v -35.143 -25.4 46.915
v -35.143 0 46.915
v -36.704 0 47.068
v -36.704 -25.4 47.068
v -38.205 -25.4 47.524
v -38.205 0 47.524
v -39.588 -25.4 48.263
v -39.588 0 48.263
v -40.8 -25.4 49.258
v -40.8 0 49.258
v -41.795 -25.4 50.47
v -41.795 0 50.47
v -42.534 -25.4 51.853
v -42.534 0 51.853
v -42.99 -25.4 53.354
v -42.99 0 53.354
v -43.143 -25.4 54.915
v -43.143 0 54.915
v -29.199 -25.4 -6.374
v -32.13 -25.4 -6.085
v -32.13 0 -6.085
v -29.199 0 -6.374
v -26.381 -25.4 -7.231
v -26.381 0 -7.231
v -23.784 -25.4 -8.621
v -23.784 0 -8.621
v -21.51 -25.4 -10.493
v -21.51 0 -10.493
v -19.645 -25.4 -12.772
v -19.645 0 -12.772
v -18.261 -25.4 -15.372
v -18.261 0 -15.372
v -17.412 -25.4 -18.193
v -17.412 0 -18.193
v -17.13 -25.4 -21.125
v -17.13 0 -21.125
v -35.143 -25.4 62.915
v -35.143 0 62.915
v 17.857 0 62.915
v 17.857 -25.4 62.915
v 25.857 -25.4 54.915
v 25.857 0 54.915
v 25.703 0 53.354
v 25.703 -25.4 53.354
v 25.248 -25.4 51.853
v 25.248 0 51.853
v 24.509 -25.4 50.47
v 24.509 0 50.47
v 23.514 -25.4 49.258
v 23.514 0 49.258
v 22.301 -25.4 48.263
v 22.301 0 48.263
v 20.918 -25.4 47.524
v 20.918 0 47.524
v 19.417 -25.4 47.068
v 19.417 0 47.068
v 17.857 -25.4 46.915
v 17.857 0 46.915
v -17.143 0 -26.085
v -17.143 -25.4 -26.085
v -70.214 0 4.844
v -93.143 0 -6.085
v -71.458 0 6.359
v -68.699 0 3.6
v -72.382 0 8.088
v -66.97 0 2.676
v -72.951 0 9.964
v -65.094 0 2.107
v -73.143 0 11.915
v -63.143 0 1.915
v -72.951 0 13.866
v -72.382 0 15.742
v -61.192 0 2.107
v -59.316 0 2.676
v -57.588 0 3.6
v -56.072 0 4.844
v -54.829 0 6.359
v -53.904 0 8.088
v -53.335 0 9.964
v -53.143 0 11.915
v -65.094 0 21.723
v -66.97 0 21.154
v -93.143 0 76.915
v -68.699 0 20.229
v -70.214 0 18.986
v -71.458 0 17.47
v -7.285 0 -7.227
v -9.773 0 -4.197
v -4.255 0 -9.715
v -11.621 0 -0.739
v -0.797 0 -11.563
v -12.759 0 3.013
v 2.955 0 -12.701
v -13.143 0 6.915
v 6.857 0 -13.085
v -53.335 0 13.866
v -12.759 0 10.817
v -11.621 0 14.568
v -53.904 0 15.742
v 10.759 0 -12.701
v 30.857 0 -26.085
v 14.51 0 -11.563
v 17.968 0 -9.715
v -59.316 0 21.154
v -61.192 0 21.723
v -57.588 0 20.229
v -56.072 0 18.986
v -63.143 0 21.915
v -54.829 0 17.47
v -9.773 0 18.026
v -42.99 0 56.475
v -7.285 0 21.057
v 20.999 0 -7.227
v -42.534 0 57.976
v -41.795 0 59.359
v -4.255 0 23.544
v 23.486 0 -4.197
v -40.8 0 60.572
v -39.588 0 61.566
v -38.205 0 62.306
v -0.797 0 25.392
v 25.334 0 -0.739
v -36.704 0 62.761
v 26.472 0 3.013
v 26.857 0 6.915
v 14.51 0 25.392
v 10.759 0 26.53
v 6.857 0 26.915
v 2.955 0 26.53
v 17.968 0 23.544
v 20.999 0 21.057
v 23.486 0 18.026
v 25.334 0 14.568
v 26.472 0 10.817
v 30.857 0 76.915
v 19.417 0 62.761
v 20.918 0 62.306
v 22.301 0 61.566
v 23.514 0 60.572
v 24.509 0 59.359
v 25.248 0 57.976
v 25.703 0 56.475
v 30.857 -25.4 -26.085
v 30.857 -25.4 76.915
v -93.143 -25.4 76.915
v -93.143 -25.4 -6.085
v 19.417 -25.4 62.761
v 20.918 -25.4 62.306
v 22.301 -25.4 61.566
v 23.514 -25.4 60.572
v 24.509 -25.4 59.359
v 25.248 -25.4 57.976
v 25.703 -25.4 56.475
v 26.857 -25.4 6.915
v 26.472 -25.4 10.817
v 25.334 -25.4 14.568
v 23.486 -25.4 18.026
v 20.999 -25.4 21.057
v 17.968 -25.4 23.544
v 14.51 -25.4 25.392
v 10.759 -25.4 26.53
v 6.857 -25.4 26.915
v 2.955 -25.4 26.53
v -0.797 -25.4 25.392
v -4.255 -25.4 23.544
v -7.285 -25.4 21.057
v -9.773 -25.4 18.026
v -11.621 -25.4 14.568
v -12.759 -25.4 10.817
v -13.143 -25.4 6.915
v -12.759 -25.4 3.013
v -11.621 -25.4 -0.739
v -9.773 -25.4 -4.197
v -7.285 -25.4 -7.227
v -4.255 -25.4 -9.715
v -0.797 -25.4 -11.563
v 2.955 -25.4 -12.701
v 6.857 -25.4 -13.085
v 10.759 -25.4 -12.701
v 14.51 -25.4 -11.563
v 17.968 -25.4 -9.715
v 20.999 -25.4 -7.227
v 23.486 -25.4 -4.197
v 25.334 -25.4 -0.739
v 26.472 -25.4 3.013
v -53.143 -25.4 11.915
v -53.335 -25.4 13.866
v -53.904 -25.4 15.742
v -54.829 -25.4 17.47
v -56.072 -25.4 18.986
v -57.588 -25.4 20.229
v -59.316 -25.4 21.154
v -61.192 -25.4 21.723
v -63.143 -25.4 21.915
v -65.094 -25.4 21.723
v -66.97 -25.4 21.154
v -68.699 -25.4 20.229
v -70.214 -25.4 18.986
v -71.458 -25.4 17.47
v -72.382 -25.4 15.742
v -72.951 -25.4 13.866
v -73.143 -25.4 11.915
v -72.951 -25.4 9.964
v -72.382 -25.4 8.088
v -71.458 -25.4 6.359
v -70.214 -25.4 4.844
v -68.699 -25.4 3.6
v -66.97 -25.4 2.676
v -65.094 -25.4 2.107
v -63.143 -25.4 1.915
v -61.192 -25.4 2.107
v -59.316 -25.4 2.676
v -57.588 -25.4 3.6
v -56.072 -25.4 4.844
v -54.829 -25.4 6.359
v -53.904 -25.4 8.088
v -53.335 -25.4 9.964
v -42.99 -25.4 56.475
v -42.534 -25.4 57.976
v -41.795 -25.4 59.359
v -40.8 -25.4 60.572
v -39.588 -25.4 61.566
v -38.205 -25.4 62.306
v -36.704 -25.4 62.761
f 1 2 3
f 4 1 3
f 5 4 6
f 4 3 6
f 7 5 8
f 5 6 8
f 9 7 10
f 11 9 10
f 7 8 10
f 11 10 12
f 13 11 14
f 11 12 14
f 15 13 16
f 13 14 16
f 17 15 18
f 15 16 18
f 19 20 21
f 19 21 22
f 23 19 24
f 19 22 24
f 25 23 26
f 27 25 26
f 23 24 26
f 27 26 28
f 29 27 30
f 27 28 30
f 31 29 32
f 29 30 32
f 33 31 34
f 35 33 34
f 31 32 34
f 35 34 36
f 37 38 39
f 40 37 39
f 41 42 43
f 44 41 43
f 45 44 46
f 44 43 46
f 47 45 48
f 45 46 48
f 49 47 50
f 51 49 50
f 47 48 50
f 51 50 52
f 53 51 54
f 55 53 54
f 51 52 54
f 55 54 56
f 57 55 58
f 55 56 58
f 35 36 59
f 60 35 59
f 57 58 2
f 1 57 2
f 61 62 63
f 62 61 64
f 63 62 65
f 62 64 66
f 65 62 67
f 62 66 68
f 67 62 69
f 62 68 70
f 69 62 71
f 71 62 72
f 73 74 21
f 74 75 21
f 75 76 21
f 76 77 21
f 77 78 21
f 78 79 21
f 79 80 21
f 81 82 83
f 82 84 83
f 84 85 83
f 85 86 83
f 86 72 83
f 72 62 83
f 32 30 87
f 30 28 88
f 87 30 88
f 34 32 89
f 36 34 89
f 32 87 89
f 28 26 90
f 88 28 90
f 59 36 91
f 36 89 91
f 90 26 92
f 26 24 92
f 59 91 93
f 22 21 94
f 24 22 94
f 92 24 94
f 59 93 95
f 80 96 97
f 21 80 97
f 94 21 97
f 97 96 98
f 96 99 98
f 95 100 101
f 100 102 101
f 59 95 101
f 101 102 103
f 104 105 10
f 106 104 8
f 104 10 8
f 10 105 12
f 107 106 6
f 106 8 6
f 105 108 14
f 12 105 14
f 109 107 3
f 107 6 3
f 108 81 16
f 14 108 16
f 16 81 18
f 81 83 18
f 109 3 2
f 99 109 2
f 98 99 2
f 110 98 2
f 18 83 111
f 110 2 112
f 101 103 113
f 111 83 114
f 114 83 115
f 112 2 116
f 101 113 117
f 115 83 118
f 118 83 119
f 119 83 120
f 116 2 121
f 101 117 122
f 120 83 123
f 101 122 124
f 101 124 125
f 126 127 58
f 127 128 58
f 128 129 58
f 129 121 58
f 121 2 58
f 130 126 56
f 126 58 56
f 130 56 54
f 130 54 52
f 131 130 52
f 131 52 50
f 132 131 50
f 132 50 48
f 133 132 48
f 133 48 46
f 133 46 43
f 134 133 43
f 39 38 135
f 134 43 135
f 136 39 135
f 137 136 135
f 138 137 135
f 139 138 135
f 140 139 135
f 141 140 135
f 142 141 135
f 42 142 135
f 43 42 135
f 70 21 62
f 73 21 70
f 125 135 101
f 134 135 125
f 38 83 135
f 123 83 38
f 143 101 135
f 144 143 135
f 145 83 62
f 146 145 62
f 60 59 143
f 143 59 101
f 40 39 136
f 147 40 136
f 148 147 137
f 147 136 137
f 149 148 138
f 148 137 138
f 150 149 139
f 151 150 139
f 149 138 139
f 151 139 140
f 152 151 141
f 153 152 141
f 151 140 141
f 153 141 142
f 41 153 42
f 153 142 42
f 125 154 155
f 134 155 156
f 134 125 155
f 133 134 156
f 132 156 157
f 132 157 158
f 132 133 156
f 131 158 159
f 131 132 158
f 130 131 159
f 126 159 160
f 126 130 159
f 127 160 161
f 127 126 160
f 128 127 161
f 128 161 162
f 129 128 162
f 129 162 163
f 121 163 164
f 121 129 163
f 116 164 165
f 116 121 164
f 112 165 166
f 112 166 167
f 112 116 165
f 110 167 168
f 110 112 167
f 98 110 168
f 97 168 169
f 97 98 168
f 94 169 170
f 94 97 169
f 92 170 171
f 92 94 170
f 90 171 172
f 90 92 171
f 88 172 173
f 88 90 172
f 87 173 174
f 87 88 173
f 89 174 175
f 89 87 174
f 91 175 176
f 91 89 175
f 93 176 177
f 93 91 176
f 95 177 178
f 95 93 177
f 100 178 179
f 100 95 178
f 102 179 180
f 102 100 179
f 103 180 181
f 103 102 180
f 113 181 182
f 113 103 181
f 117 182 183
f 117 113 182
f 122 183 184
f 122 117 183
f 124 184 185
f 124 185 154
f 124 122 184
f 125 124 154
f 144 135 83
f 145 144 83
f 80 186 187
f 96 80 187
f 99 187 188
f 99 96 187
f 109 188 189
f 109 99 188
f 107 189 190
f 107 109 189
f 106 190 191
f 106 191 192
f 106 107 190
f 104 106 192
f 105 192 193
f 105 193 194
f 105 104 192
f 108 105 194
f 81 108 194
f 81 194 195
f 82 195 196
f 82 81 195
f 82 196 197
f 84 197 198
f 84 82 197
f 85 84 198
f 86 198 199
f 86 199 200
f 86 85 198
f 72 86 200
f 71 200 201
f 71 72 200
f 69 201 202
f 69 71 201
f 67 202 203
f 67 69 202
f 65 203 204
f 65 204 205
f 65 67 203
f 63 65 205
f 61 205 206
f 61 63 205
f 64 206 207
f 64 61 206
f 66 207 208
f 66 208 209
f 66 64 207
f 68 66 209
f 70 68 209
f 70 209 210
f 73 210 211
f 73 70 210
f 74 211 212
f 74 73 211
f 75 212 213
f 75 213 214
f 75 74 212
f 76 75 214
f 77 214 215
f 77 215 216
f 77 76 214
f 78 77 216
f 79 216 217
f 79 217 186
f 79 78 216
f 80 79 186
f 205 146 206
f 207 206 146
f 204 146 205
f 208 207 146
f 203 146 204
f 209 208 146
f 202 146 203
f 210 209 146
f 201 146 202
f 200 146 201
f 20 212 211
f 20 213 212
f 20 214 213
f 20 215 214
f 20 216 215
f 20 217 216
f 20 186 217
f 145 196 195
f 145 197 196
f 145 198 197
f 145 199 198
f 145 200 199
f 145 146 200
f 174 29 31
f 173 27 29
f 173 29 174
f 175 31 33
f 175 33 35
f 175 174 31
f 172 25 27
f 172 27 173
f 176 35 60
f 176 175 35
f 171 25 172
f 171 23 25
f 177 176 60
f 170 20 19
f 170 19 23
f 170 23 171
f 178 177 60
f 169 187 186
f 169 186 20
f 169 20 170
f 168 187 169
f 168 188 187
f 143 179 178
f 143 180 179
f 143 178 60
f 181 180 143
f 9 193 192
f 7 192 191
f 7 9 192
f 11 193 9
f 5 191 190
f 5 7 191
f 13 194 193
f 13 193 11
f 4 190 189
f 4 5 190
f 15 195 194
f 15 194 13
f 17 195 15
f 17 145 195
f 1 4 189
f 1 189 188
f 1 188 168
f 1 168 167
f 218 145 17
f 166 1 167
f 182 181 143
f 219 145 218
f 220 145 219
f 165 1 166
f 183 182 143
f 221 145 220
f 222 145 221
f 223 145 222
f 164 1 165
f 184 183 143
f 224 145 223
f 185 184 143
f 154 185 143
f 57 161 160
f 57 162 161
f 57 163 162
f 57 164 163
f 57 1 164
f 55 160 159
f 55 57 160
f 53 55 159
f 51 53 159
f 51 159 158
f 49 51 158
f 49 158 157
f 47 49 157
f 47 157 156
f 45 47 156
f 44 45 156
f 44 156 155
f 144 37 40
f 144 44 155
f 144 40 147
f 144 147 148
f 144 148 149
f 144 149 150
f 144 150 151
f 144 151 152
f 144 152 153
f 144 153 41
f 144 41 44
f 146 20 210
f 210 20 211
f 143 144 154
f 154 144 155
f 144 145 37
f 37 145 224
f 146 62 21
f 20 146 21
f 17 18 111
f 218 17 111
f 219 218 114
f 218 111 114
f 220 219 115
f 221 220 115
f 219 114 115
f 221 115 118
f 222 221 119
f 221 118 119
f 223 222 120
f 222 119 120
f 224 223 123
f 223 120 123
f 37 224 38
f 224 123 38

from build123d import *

# Parameters (mm, degrees)
F0_R     = 10
F0_R_2   = 20
F1_DEPTH = 25.4


with BuildPart() as f1:
    # F0 (on Front) → F1 (new body)
    with BuildSketch(Plane.XZ):
        with BuildLine():
            Line((-43.143227, 76.914711), (-93.143227, 76.914711))
            Line((-93.143227, 76.914711), (-93.143227, 11.914711))
            Line((-93.143227, 11.914711), (-93.143227, -6.085289))
            Line((-93.143227, -6.085289), (-64.090909, -6.085289))
            Line((-64.090909, -6.085289), (-32.130199, -6.085289))
            ThreePointArc((-32.130199, -6.085289), (-21.509733, -10.492569), (-17.13025, -21.124528))
            Line((-17.13025, -21.124528), (-17.143227, -26.085289))
            Line((-17.143227, -26.085289), (6.856773, -26.085289))
            Line((6.856773, -26.085289), (30.856773, -26.085289))
            Line((30.856773, -26.085289), (30.856773, 6.914711))
            Line((30.856773, 6.914711), (30.856773, 46.914711))
            Line((30.856773, 46.914711), (30.856773, 62.914711))
            Line((30.856773, 62.914711), (30.856773, 76.914711))
            Line((30.856773, 76.914711), (25.856773, 76.914711))
            Line((25.856773, 76.914711), (-43.143227, 76.914711))
        make_face()
        with Locations((-63.143227, 11.914711)):
            Circle(F0_R, mode=Mode.SUBTRACT)
        with Locations((6.856773, 6.914711)):
            Circle(F0_R_2, mode=Mode.SUBTRACT)
        with BuildLine():
            ThreePointArc((25.856773, 54.914711), (23.513628, 49.257857), (17.856773, 46.914711))
            Line((17.856773, 46.914711), (-35.143227, 46.914711))
            ThreePointArc((-35.143227, 46.914711), (-40.800081, 49.257857), (-43.143227, 54.914711))
            ThreePointArc((-43.143227, 54.914711), (-40.800081, 60.571565), (-35.143227, 62.914711))
            Line((-35.143227, 62.914711), (17.856773, 62.914711))
            ThreePointArc((17.856773, 62.914711), (23.513628, 60.571565), (25.856773, 54.914711))
        make_face(mode=Mode.SUBTRACT)
    extrude(amount=F1_DEPTH)


solid = f1.part
